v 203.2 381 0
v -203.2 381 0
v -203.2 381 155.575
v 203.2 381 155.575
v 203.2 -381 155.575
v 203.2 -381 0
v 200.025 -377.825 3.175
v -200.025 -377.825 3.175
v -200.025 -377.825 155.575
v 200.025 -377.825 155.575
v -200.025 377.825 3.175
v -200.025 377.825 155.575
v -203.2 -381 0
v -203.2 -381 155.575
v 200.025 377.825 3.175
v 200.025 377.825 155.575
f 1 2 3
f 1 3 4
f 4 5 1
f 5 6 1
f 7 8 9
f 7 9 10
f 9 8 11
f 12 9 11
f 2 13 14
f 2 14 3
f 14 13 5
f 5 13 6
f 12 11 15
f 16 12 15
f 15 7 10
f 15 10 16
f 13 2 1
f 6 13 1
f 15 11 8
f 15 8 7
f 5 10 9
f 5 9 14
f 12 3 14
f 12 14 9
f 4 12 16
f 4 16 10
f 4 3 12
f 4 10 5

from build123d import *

# Parameters (mm, degrees)
F0_W     = 406.4
F0_H     = 762
F1_DEPTH = 3.175
F2_W     = 406.4
F2_H     = 3.175
F3_DEPTH = 152.4
F4_W     = 3.175
F4_H     = 758.825
F5_DEPTH = 152.4
F6_W     = 403.225
F6_H     = 3.175
F7_DEPTH = 152.4
F8_W     = 3.175
F8_H     = 755.65
F9_DEPTH = 152.4


with BuildPart() as f1:
    # F0 (on Top) → F1 (new body)
    with BuildSketch(Plane.XY):
        Rectangle(F0_W, F0_H)
    extrude(amount=F1_DEPTH)

    # F2 (on face) → F3 (join)
    with BuildSketch(Plane.XY.offset(3.175)):
        with Locations((0, 379.4125)):
            Rectangle(F2_W, F2_H)
    extrude(amount=F3_DEPTH)

    # F4 (on face) → F5 (join)
    with BuildSketch(Plane.XY.offset(3.175)):
        with Locations((201.6125, -1.5875)):
            Rectangle(F4_W, F4_H)
    extrude(amount=F5_DEPTH)

    # F6 (on face) → F7 (join)
    with BuildSketch(Plane.XY.offset(3.175)):
        with Locations((-1.5875, -379.4125)):
            Rectangle(F6_W, F6_H)
    extrude(amount=F7_DEPTH)

    # F8 (on face) → F9 (join)
    with BuildSketch(Plane.XY.offset(3.175)):
        with Locations((-201.6125, 0)):
            Rectangle(F8_W, F8_H)
    extrude(amount=F9_DEPTH)


solid = f1.part
